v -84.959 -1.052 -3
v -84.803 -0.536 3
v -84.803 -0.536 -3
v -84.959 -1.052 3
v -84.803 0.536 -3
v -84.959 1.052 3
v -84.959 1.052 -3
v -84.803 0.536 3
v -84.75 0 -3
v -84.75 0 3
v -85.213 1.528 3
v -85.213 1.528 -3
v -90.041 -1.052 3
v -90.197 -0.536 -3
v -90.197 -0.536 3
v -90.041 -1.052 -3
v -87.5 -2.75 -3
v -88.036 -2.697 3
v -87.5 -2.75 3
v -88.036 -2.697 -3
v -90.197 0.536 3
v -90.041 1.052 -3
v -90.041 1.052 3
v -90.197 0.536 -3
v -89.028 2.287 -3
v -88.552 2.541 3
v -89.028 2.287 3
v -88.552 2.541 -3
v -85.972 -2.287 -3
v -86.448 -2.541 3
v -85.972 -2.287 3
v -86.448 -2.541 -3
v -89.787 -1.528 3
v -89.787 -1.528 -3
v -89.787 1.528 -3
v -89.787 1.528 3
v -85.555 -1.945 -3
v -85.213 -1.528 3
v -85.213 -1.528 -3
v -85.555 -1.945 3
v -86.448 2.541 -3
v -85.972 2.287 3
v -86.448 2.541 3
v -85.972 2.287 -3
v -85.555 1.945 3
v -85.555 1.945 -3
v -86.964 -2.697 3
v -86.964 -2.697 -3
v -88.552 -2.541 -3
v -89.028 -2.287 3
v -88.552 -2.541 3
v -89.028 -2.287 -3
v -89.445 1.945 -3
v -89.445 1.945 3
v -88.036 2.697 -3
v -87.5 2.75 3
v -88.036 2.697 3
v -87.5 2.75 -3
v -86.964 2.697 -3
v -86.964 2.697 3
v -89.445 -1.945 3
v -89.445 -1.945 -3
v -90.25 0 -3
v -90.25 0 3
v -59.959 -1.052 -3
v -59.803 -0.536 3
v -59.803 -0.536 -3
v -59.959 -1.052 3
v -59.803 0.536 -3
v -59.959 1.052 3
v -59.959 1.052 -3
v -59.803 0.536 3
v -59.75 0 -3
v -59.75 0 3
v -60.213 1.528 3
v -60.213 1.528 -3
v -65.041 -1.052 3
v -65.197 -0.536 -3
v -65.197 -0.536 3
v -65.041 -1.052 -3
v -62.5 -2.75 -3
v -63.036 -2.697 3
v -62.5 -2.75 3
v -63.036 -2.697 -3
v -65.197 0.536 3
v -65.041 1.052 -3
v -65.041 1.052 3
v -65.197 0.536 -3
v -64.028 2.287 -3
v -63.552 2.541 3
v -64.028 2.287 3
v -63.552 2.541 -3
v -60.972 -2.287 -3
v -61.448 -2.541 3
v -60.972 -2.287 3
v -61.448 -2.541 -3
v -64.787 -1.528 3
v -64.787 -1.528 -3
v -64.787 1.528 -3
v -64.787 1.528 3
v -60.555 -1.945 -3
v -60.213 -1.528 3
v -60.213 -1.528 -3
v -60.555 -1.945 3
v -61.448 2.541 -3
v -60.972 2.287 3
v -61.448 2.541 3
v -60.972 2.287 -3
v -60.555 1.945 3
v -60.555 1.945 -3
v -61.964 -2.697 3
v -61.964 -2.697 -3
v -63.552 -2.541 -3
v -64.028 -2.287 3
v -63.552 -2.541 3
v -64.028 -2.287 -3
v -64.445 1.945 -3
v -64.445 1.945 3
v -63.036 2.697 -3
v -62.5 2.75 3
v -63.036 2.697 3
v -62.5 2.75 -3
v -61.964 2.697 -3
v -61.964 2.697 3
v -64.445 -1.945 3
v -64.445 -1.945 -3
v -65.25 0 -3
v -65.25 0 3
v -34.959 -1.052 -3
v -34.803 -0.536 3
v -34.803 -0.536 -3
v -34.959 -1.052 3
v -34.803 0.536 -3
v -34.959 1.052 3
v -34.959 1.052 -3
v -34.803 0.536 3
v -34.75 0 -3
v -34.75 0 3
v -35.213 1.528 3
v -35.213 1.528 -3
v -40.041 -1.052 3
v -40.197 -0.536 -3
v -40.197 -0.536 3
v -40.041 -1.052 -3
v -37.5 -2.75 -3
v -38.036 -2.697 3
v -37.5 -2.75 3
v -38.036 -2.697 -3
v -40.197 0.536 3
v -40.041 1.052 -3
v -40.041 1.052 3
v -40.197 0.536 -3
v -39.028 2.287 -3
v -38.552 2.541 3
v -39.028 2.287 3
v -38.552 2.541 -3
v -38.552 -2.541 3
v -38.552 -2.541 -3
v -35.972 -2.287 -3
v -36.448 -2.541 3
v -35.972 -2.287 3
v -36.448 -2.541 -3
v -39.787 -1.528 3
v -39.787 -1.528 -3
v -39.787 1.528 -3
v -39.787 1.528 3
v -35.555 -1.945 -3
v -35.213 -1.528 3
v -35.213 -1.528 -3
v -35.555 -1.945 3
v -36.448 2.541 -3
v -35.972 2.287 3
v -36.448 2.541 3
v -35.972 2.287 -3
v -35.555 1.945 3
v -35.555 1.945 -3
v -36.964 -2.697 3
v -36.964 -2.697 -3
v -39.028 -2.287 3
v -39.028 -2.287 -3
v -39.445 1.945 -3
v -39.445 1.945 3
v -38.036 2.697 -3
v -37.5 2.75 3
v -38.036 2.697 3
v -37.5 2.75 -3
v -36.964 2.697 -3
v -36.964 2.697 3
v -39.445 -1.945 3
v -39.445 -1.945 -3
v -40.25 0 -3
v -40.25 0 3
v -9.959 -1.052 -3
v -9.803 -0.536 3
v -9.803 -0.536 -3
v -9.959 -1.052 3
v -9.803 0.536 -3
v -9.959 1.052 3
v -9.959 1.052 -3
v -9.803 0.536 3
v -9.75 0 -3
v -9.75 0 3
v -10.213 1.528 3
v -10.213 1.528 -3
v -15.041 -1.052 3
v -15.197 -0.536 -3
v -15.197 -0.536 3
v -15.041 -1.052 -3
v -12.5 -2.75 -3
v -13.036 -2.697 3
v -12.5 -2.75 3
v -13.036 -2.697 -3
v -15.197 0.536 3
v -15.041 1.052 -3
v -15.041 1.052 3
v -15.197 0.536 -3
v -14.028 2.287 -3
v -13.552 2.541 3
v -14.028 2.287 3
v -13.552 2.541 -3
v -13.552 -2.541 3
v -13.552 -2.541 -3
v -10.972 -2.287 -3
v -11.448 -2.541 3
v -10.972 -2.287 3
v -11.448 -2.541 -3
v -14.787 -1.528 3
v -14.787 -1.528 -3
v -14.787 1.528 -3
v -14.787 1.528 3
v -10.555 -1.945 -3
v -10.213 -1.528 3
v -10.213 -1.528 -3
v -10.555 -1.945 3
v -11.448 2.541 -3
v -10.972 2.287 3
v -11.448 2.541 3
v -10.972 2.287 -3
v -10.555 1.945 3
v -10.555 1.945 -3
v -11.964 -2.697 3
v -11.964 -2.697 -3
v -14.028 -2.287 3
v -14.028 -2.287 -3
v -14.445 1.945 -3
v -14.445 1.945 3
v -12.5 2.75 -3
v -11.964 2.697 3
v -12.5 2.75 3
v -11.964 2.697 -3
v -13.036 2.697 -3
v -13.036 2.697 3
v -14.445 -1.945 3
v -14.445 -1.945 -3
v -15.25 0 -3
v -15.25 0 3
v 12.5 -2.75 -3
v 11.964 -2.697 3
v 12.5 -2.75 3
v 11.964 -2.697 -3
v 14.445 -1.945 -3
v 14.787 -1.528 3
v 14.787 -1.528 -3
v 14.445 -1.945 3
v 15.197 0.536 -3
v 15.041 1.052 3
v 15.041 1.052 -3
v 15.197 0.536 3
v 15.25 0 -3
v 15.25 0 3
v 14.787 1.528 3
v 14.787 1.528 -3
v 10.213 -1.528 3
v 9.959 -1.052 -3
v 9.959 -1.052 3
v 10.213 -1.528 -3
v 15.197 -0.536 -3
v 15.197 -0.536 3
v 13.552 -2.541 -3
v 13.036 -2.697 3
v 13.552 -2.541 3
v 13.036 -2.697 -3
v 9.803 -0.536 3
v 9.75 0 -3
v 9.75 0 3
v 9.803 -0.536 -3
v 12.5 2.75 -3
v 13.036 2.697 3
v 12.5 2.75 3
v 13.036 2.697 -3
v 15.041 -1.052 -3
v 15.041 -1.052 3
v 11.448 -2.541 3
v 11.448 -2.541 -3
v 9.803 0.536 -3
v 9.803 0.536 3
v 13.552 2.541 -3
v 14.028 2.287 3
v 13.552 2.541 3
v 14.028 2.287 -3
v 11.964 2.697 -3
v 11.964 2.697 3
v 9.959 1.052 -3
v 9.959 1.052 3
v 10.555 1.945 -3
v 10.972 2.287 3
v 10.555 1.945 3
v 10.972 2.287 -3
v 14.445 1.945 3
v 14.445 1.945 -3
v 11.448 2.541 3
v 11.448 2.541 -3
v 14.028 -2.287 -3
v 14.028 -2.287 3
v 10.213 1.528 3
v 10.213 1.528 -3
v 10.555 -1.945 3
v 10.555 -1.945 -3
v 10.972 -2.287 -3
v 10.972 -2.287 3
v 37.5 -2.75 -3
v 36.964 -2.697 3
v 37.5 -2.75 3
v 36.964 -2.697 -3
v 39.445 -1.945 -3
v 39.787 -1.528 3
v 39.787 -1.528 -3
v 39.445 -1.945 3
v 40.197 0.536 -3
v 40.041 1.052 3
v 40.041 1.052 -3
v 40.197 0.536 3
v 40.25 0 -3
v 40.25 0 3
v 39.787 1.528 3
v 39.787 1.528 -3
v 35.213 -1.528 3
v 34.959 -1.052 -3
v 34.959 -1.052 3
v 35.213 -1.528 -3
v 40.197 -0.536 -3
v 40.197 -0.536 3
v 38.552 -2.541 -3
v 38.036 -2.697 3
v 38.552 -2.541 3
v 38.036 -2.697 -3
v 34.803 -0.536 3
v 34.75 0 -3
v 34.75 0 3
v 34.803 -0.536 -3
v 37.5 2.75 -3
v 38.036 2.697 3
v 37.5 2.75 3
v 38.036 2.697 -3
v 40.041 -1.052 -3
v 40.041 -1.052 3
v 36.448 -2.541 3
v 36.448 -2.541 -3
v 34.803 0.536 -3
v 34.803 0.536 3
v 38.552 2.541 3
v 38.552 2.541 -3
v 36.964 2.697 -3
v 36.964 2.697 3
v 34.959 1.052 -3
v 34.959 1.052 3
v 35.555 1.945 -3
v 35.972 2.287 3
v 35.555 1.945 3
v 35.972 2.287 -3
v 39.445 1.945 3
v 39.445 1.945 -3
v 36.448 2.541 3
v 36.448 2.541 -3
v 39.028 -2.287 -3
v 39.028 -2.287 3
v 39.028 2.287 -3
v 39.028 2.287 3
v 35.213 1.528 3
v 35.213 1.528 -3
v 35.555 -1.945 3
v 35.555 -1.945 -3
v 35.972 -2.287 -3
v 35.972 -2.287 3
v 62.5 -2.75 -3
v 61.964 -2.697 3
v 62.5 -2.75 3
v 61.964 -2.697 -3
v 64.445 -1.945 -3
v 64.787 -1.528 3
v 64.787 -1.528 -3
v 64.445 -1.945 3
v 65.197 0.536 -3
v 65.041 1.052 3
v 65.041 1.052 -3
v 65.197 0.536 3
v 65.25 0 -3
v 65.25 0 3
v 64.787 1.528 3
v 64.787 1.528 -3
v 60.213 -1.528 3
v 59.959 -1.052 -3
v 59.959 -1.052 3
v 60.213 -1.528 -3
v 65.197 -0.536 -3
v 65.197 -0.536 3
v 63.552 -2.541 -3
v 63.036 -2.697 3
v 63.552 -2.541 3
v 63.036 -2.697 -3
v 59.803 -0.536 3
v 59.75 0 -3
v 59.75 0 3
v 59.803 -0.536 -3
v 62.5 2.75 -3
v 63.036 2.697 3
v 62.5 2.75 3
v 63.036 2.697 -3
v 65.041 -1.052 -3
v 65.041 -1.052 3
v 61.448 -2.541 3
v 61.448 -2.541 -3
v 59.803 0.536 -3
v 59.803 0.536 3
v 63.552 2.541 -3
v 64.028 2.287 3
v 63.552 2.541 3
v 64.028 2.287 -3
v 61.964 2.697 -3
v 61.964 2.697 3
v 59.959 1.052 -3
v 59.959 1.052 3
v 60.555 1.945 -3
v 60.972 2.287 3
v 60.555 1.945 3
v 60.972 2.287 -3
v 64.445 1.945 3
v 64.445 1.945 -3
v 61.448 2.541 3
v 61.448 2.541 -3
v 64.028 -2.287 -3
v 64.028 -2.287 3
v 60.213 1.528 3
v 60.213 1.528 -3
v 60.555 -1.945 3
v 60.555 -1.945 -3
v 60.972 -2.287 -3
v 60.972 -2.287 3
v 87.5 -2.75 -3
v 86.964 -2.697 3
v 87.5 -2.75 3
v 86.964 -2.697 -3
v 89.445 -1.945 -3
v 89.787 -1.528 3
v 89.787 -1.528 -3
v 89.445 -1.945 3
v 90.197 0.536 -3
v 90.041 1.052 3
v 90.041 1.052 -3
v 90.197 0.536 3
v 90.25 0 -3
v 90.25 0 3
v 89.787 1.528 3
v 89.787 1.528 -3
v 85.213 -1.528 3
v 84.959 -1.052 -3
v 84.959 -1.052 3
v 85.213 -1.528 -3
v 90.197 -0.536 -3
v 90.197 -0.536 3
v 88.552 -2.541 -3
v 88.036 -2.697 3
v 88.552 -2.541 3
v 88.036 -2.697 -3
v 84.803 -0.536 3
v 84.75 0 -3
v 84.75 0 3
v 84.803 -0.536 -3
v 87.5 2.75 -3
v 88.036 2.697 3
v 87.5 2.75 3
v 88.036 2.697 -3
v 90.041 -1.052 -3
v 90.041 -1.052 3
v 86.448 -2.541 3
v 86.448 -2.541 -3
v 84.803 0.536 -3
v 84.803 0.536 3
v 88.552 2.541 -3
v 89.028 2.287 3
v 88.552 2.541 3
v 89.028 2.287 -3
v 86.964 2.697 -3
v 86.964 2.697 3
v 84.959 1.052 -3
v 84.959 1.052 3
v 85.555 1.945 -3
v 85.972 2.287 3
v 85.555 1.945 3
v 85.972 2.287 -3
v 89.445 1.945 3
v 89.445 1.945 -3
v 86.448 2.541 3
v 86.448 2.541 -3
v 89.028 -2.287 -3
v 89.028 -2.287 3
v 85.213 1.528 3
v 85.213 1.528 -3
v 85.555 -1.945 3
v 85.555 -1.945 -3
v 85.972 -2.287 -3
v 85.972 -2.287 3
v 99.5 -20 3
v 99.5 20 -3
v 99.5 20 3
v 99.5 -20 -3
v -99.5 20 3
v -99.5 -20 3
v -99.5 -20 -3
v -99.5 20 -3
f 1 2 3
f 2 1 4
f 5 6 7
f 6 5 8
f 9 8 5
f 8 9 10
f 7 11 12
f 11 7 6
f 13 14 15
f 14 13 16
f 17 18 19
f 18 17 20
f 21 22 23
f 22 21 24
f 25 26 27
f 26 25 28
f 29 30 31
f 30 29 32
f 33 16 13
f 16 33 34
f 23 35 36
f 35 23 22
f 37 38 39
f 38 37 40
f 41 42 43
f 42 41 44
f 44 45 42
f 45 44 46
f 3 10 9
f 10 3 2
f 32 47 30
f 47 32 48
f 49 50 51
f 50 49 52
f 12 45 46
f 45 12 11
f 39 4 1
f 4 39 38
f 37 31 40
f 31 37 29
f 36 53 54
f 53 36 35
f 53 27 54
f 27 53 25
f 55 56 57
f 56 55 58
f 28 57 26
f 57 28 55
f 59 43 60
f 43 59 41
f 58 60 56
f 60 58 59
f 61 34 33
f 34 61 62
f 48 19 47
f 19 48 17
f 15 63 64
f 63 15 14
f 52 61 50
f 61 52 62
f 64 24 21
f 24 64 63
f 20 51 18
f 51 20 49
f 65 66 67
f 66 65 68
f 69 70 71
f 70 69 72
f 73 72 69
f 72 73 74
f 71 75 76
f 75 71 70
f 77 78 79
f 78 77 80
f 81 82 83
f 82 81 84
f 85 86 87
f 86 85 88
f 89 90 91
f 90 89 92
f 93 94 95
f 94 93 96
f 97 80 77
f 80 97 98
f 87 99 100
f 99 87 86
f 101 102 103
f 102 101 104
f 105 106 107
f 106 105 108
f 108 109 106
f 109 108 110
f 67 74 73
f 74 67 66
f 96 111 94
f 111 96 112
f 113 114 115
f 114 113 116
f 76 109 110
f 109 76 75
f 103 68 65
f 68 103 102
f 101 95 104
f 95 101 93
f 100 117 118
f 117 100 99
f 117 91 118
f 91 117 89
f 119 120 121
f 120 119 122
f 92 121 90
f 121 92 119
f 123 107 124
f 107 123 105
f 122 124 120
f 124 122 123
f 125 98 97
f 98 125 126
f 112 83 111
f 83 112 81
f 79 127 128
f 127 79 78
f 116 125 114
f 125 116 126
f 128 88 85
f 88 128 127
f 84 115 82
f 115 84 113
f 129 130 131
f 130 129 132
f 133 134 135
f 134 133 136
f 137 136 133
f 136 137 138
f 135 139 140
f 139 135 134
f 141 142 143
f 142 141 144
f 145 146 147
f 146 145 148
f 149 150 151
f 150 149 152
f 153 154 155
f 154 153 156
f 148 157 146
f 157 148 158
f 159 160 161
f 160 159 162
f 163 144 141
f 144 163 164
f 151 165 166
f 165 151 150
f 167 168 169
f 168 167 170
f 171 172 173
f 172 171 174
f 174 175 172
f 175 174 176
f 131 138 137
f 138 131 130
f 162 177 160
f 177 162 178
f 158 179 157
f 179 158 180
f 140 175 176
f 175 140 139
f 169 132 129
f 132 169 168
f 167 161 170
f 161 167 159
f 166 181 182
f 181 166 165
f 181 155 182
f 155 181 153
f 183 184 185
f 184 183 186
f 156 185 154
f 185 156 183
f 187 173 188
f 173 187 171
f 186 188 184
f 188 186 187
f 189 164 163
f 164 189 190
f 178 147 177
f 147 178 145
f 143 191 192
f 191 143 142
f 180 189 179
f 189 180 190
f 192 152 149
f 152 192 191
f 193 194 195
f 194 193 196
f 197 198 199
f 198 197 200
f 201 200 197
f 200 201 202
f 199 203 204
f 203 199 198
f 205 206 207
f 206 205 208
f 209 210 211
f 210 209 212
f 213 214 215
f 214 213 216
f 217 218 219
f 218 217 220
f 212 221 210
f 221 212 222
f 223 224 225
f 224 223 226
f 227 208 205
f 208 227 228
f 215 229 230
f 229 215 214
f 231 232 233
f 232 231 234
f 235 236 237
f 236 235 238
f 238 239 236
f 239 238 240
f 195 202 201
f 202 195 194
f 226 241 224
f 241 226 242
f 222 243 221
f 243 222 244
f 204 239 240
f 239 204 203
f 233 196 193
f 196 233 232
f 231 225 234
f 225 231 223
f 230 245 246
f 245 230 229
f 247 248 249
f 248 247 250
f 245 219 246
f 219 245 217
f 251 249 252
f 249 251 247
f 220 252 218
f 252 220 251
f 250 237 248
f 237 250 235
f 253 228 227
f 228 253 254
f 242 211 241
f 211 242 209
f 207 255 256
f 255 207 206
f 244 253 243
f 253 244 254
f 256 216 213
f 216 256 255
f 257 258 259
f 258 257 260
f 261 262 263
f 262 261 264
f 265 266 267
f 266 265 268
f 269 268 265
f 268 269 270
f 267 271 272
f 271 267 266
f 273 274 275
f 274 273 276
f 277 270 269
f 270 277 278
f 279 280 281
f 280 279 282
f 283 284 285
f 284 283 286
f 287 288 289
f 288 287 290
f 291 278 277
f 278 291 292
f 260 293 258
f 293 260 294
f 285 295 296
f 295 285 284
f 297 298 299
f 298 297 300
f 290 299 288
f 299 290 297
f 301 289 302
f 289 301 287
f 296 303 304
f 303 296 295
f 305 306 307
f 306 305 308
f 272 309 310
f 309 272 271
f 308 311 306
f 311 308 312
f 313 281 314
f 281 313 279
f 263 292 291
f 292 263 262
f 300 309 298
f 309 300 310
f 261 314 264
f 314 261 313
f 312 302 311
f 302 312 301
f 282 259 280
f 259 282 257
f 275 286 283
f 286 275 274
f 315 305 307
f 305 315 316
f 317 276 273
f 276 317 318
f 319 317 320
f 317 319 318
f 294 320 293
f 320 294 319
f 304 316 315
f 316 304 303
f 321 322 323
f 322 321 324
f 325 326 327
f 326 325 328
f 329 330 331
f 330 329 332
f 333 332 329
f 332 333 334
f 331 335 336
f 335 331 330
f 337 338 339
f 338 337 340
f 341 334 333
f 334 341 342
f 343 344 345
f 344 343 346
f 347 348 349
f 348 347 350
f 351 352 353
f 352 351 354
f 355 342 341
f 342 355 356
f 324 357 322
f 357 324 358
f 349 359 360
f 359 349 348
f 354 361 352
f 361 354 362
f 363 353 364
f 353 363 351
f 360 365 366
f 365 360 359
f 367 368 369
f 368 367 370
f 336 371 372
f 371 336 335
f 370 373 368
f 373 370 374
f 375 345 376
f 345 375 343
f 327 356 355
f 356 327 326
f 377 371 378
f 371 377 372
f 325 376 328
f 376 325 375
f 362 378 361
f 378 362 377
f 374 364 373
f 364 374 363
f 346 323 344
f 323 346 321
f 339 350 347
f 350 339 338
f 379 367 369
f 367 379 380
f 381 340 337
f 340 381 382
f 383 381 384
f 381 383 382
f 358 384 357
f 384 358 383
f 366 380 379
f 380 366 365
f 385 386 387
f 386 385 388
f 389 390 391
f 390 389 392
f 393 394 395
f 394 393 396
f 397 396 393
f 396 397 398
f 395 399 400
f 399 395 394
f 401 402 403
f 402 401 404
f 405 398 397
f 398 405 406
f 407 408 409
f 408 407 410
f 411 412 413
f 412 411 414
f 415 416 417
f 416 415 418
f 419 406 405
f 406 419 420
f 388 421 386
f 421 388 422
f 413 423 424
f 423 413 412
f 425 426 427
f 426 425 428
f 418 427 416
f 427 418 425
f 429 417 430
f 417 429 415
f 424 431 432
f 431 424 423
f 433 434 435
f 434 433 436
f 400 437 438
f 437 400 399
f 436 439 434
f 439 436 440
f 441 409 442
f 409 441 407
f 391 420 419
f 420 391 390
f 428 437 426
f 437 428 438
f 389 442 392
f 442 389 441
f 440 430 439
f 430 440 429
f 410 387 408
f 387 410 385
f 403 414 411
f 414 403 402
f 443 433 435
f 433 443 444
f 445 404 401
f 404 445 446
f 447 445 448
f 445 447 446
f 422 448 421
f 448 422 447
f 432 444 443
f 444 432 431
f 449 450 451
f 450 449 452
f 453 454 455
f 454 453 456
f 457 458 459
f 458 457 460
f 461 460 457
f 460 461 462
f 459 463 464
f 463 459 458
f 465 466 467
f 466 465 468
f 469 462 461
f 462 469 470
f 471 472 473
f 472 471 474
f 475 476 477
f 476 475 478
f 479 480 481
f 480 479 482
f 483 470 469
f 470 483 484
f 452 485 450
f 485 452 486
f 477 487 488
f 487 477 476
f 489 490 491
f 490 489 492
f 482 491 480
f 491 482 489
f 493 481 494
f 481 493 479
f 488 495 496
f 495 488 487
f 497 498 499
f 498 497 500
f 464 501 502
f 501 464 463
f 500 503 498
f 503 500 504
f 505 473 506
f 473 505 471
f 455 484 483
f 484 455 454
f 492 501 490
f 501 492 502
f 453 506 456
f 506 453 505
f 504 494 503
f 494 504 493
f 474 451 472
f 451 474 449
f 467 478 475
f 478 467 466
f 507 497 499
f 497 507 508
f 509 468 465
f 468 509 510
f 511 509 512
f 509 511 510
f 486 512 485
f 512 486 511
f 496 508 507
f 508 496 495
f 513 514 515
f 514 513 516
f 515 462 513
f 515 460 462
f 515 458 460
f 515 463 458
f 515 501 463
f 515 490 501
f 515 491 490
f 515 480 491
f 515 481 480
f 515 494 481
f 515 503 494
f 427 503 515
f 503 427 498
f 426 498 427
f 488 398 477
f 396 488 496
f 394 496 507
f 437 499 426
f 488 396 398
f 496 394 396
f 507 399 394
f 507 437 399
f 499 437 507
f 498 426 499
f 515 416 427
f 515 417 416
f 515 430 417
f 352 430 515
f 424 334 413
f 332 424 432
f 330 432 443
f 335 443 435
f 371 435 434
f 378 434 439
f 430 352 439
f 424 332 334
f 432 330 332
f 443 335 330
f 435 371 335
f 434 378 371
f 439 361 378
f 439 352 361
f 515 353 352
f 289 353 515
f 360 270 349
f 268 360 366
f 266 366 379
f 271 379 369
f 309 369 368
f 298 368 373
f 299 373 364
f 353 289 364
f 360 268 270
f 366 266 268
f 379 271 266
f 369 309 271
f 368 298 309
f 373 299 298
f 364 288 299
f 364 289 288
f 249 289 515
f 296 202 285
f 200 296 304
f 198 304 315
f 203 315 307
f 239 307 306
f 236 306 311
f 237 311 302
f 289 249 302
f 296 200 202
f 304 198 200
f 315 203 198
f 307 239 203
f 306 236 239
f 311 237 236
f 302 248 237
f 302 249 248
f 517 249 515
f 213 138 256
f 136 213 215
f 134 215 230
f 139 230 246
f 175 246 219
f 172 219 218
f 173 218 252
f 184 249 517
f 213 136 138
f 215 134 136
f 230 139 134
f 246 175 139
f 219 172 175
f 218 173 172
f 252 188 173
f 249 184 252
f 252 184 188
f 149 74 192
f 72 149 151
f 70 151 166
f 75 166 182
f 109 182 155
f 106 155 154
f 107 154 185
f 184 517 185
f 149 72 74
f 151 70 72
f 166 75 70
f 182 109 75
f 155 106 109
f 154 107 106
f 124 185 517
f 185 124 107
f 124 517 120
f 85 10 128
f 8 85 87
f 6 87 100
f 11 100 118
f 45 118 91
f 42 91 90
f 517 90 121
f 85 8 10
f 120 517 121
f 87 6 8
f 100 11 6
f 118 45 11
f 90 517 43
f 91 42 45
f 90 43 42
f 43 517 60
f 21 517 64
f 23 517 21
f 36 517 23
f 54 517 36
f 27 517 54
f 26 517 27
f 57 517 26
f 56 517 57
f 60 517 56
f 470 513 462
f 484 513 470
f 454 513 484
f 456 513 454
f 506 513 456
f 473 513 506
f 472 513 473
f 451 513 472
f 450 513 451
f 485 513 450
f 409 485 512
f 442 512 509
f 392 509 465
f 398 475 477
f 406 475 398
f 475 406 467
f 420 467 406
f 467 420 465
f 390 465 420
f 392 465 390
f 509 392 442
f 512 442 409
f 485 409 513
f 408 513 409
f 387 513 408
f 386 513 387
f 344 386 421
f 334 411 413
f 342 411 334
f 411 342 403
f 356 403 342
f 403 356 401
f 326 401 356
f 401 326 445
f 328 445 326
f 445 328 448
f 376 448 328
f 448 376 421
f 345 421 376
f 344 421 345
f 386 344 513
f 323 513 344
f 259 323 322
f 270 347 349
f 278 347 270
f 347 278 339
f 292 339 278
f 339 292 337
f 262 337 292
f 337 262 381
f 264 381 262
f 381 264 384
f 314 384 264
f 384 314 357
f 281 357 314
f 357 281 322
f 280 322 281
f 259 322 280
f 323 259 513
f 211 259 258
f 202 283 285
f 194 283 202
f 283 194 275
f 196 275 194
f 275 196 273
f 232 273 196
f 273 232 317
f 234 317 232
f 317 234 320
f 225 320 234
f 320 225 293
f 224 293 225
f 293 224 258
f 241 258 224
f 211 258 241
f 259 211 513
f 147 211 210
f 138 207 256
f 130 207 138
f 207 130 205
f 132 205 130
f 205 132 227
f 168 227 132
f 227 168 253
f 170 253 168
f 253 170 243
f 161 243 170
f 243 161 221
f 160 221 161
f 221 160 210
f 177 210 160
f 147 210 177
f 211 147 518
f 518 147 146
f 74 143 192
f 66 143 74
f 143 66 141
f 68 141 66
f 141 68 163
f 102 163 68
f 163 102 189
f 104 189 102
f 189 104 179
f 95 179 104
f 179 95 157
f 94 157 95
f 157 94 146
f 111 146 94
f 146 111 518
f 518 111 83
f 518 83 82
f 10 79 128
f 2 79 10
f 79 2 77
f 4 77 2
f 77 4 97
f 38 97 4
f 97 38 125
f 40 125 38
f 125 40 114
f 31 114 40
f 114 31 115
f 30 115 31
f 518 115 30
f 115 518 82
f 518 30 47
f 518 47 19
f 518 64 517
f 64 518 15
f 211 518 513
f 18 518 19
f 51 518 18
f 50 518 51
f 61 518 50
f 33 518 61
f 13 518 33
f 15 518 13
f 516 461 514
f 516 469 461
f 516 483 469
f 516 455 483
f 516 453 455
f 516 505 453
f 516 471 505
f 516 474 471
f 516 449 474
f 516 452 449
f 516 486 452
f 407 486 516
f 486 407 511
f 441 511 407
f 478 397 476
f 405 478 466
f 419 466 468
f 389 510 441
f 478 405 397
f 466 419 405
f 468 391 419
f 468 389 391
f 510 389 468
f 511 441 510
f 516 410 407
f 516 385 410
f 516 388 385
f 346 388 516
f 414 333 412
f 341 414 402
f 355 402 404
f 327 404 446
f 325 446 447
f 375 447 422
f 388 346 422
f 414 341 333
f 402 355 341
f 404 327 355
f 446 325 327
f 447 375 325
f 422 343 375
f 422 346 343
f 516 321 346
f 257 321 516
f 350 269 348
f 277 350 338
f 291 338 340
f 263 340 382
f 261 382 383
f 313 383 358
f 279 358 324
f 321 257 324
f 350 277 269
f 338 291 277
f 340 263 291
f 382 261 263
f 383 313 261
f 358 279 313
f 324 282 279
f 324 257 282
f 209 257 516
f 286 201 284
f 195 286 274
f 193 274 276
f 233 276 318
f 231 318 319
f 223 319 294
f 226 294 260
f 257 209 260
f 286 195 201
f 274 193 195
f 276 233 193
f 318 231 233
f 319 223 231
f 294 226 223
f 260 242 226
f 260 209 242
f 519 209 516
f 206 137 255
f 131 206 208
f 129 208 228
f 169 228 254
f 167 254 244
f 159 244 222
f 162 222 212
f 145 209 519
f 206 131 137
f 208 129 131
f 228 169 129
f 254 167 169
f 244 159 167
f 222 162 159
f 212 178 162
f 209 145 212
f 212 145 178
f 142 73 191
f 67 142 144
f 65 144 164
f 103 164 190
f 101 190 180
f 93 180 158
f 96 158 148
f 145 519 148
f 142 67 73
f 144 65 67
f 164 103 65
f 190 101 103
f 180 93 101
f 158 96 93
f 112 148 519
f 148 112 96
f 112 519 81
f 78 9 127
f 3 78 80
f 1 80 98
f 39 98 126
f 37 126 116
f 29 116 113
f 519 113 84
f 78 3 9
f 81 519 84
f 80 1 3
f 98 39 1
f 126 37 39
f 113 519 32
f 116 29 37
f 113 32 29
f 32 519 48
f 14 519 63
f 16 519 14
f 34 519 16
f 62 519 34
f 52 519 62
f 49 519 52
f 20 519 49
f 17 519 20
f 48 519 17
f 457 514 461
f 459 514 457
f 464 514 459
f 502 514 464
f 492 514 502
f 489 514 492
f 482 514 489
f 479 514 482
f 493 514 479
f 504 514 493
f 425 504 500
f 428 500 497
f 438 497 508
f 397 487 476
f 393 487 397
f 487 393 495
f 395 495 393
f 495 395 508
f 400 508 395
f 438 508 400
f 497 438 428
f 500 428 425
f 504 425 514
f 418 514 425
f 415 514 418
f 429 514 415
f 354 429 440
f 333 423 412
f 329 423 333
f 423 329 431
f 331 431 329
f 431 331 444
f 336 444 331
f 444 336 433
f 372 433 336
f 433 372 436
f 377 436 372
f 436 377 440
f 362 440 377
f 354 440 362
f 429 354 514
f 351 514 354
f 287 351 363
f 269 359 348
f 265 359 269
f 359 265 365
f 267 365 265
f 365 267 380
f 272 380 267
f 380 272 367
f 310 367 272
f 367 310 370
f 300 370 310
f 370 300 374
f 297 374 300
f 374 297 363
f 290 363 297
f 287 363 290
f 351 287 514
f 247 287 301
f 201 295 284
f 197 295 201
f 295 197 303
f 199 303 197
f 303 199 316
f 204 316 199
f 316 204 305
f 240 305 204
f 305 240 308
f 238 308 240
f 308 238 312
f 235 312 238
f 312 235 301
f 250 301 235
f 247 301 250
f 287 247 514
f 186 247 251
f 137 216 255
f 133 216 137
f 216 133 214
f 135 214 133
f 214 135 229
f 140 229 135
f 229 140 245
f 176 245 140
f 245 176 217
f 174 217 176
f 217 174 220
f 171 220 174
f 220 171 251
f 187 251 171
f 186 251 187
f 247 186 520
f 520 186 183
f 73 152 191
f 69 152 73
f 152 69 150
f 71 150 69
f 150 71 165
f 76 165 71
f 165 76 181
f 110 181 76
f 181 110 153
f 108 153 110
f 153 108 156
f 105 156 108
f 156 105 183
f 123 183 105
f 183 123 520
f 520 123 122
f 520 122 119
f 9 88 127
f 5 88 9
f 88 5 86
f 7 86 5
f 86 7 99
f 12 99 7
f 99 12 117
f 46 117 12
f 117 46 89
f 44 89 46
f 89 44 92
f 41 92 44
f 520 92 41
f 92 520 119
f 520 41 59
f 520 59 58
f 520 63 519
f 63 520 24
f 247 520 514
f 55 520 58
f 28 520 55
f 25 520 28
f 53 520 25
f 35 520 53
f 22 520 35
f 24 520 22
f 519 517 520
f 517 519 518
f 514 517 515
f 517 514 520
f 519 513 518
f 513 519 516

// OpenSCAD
$fn = 32;

// ----------------------------------------------------------------------
// Hole bar, 8 x Ø5.5
// skip layout, 12 mm edge offset
// ----------------------------------------------------------------------

// --- parameters (mm) ---
bar_w = 40;         // bar width (Y)
bar_t = 6;          // bar thickness (Z)
holes = 8;          // holes per row
hole_d = 5.5;       // hole diameter
edge = 12;          // offset from the bar end to the first hole
grid_pitch = 12.5;  // grid the bar was laid out on

// --- derived feature positions (mm) ---
pitch = grid_pitch * 2;       // = 25   holes sit every other grid slot
span = (holes - 1) * pitch;   // = 175   distance between the end holes
bar_l = span + 2 * edge;      // = 199   overall bar length
start_x = -bar_l / 2 + edge;  // = -87.5   X of the first hole
feature_centers = [
  [start_x + 0 * pitch, 0],
  [start_x + 1 * pitch, 0],
  [start_x + 2 * pitch, 0],
  [start_x + 3 * pitch, 0],
  [start_x + 4 * pitch, 0],
  [start_x + 5 * pitch, 0],
  [start_x + 6 * pitch, 0],
  [start_x + 7 * pitch, 0]
];   // hole centres of the first row

// bar with one row of holes, drilled from feature_centers
difference() {
  translate([-bar_l / 2, -bar_w / 2, -bar_t / 2]) cube([bar_l, bar_w, bar_t]);
  for (centre = feature_centers)
    translate([centre[0], centre[1], 0])
      cylinder(d = hole_d, h = bar_t + 2, center = true);
}
